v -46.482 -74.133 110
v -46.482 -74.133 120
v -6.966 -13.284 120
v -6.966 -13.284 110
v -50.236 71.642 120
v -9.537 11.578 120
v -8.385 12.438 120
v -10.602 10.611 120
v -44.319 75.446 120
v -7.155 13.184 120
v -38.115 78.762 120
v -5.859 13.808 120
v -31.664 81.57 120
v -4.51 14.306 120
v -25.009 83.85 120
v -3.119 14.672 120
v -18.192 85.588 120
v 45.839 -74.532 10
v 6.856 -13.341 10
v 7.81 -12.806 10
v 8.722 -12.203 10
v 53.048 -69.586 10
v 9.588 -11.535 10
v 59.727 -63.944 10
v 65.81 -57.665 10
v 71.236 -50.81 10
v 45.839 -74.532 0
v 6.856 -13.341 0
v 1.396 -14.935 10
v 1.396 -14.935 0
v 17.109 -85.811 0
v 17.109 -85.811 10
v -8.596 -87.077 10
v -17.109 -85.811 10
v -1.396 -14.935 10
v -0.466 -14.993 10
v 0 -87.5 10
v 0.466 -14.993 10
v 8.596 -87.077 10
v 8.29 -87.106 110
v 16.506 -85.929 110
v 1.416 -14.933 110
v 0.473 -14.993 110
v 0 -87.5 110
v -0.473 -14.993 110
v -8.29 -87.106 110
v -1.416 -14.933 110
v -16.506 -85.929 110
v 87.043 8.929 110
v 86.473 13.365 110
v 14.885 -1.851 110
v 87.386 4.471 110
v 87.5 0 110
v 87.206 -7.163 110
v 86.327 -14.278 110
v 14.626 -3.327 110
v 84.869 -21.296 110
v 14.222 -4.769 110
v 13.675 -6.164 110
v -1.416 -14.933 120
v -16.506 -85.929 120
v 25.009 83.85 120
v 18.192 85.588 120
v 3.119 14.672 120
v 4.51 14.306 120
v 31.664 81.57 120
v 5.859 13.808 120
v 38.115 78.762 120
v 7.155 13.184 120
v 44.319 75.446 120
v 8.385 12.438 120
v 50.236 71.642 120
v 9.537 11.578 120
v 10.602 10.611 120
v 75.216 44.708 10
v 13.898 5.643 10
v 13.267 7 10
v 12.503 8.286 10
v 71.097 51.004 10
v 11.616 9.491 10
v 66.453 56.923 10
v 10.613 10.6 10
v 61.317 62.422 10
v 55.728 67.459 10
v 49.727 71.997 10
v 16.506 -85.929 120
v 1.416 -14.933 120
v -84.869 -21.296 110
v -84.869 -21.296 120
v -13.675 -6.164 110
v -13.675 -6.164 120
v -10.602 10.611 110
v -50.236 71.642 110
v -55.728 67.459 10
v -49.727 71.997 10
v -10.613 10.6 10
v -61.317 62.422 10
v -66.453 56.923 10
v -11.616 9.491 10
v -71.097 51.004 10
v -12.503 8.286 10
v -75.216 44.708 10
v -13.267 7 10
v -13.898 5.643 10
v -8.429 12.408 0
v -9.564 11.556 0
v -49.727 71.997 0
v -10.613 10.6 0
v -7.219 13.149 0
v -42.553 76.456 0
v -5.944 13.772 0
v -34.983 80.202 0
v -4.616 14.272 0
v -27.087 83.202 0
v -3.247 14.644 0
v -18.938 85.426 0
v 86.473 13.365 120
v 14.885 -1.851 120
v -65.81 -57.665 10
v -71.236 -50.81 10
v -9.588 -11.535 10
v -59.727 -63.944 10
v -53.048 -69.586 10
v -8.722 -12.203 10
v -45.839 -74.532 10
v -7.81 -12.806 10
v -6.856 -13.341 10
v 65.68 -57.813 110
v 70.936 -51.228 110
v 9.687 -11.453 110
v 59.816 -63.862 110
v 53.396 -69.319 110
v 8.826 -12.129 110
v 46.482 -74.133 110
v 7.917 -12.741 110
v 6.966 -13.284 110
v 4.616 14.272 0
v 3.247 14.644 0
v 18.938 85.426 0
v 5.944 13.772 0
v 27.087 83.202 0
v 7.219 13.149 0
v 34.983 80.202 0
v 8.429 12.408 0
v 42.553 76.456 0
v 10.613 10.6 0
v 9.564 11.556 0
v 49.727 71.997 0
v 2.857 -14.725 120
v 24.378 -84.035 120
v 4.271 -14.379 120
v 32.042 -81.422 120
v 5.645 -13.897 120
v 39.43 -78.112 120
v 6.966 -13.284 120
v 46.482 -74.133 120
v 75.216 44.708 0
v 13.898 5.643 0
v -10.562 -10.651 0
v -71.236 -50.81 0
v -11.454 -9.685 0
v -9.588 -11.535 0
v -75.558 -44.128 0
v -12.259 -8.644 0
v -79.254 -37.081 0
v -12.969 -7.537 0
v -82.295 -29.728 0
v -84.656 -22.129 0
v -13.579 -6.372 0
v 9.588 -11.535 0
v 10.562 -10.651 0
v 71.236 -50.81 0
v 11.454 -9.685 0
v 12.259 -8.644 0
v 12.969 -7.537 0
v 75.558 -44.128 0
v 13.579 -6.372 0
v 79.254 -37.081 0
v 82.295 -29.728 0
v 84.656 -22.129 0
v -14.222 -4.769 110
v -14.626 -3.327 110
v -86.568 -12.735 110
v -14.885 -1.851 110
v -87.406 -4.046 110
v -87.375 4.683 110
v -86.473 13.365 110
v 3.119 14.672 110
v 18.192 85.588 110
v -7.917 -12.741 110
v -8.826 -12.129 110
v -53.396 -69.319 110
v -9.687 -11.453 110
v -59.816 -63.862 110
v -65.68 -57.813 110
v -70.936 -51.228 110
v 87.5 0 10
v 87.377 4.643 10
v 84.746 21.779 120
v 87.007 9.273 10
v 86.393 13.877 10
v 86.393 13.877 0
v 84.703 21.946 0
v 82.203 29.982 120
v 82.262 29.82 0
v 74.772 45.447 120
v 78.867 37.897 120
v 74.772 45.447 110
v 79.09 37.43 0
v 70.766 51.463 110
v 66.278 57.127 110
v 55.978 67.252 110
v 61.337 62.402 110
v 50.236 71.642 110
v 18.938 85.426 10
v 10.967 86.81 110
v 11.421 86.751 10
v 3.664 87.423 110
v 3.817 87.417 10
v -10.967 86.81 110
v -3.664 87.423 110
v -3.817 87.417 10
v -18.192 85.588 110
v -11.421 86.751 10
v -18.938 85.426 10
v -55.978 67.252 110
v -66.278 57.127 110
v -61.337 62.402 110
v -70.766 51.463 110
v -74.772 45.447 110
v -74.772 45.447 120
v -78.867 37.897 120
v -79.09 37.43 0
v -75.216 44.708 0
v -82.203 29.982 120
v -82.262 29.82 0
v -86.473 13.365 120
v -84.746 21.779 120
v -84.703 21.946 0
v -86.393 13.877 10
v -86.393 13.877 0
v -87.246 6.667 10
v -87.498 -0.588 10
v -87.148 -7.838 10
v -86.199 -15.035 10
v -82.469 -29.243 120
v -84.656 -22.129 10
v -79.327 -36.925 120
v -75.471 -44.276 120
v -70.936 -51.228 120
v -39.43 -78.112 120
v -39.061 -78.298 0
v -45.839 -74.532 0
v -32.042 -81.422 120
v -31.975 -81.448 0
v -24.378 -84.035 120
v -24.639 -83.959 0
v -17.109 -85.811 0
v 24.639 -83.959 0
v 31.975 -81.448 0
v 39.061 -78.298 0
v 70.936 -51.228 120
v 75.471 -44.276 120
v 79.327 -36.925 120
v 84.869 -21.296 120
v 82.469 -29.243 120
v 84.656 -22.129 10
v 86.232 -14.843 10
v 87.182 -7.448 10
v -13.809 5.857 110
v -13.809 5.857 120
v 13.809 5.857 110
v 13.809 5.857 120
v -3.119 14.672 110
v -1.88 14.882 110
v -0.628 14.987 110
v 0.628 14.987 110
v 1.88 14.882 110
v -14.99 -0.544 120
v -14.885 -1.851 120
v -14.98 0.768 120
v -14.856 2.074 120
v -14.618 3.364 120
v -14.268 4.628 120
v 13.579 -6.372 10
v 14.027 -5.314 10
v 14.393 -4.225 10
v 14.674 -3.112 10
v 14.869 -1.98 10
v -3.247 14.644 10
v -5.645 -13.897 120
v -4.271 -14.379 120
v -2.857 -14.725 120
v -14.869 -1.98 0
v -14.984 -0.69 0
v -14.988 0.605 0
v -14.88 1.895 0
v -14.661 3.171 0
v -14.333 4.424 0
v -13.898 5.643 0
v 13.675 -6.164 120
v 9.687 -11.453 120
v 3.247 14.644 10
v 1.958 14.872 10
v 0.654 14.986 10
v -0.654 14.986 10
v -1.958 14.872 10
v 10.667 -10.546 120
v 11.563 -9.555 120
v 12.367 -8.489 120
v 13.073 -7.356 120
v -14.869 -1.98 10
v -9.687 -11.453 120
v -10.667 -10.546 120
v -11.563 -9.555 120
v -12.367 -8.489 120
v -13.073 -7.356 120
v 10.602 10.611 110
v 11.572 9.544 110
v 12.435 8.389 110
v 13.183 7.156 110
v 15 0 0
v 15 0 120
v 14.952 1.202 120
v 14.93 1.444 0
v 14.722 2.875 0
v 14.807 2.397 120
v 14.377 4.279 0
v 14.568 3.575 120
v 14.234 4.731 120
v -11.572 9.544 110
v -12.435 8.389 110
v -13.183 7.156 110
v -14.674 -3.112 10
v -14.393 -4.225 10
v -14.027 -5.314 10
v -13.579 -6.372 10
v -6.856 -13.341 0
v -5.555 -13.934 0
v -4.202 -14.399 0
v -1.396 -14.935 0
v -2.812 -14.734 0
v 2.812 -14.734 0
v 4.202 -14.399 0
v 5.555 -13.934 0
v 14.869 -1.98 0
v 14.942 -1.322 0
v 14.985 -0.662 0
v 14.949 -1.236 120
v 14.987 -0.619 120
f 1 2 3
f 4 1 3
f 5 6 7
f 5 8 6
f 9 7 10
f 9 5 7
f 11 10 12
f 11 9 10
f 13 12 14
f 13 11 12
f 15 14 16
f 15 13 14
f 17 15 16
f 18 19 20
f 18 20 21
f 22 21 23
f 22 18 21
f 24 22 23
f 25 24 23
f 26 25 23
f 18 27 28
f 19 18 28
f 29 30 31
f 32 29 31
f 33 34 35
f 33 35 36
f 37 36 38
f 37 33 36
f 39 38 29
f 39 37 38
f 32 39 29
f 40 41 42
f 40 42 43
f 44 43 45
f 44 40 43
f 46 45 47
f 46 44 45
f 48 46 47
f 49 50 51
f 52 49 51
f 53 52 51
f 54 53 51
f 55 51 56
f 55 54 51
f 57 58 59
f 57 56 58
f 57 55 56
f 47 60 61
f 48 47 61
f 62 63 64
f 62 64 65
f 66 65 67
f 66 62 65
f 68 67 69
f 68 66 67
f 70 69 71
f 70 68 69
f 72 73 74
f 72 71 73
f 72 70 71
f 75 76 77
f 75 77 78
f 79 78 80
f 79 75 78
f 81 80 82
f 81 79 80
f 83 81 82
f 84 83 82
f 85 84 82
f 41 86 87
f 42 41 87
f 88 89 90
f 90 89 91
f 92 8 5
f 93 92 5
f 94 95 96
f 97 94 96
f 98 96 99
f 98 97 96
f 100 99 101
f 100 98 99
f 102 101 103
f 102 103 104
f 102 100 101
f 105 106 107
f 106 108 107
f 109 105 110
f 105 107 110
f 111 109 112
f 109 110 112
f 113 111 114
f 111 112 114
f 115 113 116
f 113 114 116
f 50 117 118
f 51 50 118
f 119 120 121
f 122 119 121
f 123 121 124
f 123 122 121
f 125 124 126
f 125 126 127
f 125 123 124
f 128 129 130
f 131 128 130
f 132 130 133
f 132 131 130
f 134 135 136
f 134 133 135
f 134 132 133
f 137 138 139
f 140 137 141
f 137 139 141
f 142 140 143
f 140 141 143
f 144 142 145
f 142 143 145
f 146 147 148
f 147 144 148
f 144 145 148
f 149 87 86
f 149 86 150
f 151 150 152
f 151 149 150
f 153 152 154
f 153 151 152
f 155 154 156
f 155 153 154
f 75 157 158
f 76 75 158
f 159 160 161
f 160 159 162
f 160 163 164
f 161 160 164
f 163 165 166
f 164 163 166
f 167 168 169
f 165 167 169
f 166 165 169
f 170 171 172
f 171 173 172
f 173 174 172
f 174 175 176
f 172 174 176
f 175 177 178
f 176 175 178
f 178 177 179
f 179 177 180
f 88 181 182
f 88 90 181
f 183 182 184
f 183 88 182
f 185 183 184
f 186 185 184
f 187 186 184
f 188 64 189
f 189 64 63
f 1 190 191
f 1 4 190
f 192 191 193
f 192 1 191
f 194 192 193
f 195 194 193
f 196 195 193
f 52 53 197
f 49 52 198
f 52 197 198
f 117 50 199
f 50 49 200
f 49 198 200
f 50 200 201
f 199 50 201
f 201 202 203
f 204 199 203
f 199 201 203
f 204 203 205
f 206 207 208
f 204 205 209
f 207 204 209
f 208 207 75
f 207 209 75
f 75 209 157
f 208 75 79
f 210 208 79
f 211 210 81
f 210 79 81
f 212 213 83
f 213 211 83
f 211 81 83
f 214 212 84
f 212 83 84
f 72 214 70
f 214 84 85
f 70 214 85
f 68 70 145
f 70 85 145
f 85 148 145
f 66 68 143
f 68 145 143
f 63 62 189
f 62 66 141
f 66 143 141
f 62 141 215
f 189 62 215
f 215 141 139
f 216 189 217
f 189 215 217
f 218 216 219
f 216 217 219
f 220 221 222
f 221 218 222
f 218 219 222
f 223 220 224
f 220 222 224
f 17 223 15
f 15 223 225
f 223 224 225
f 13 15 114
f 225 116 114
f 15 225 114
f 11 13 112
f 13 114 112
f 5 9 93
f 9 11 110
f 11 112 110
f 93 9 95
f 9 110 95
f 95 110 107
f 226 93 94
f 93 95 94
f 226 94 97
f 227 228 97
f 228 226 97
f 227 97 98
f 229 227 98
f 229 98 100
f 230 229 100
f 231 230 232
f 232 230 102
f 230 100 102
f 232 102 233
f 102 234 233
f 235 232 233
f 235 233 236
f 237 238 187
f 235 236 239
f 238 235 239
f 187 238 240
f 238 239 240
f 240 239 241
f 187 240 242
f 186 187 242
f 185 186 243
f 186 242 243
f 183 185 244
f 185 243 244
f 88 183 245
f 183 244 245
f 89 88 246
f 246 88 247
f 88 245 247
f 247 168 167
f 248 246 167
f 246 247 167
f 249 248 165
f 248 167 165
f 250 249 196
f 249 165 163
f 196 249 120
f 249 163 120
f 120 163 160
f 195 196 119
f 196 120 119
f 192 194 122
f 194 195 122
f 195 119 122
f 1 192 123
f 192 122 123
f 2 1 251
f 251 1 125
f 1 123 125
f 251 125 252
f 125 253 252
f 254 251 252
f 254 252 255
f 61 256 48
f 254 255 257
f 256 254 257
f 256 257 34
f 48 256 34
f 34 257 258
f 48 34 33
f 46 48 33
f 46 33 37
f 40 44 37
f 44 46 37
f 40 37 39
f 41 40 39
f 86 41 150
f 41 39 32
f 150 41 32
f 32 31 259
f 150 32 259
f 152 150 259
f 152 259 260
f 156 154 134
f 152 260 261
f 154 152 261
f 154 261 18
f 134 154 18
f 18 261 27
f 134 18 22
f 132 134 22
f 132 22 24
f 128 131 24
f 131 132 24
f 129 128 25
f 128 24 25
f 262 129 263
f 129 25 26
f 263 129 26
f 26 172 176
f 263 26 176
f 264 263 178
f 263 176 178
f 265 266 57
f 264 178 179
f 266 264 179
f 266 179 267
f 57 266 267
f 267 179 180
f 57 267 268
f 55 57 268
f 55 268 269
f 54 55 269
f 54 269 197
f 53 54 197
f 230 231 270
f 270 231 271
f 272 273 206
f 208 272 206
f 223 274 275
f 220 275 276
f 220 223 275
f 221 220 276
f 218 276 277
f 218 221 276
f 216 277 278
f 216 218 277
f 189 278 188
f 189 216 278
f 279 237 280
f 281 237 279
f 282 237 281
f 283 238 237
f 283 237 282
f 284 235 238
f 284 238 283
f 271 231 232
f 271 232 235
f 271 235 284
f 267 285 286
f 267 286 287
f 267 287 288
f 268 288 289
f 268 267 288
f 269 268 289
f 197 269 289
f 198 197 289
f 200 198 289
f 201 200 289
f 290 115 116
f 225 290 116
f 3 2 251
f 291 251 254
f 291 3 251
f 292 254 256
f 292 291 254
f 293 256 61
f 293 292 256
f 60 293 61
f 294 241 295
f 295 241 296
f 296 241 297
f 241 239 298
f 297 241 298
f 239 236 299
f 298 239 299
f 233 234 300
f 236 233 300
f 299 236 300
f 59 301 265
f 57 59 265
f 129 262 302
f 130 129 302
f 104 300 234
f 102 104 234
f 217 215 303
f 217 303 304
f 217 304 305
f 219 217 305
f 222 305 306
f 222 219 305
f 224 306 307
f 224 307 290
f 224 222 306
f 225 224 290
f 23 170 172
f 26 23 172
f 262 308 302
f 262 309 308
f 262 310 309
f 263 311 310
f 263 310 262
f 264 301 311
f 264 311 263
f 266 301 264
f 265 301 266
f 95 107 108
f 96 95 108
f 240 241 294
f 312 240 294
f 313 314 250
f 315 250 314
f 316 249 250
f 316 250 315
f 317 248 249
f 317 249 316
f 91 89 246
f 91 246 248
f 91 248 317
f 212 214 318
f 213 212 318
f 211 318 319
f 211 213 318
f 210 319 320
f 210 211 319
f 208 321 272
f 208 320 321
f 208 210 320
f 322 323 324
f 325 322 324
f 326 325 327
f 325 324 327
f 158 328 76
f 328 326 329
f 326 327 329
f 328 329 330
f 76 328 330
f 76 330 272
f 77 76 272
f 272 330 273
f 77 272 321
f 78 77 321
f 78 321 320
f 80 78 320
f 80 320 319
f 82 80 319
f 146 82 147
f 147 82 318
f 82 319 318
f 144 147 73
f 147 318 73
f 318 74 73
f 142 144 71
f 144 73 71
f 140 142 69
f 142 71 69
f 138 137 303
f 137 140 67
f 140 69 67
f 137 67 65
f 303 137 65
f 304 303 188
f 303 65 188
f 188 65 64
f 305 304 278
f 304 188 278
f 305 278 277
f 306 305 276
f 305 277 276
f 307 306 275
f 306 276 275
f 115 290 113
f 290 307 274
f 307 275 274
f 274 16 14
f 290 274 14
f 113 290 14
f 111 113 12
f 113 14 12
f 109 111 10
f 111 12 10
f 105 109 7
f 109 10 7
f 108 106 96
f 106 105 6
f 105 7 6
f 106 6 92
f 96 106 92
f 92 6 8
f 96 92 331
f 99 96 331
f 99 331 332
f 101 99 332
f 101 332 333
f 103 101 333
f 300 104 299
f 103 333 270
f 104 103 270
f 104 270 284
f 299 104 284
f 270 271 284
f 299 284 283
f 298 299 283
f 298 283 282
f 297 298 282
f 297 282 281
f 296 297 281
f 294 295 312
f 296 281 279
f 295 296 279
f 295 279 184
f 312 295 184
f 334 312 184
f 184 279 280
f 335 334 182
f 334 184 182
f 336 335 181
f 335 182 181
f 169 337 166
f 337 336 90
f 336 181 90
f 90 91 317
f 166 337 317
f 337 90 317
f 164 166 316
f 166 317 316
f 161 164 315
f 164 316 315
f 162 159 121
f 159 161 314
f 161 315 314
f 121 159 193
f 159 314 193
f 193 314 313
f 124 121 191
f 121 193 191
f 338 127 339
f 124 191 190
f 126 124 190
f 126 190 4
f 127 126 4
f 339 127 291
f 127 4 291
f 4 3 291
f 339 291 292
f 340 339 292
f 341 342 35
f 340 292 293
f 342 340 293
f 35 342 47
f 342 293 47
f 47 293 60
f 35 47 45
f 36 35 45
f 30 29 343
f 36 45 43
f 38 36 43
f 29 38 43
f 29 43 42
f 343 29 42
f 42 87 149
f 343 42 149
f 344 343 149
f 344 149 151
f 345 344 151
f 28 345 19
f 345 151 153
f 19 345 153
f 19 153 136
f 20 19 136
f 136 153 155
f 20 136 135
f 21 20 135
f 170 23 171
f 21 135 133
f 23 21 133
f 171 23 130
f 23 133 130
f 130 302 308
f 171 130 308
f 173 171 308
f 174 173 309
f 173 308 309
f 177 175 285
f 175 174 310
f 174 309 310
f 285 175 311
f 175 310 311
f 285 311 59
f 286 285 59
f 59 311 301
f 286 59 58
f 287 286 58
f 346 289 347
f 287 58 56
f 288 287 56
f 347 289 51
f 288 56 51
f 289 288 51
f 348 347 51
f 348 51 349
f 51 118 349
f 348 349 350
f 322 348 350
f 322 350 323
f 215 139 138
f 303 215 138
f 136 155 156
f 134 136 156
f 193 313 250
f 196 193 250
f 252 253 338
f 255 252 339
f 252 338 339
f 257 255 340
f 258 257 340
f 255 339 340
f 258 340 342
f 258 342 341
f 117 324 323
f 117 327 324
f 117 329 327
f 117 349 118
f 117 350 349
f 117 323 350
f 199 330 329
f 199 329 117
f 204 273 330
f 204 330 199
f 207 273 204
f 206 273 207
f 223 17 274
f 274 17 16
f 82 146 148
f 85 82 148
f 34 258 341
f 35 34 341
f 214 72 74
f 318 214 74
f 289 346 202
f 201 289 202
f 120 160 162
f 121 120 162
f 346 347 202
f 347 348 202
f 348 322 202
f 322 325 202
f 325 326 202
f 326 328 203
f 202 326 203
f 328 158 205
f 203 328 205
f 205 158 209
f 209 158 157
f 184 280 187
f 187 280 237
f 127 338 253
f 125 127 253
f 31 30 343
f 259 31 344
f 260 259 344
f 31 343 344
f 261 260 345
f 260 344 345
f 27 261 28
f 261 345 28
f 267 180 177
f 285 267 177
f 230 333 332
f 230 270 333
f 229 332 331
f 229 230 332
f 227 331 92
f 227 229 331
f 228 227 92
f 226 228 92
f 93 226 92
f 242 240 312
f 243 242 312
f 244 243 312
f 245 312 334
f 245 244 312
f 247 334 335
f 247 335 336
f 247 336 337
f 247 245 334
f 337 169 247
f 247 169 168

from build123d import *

# Parameters (mm, degrees)
SKETCH1_R           = 87.5
BOSS_EXTRUDE1_DEPTH = 120
CUT_EXTRUDE1_DEPTH  = 10
CIRPATTERN1_COUNT   = 8
CUT_EXTRUDE2_DEPTH  = 10
CIRPATTERN2_COUNT   = 8
SKETCH5_R           = 15
CUT_EXTRUDE3_DEPTH  = 121


with BuildPart() as part:
    # Sketch1 → Boss-Extrude1 (new body)
    with BuildSketch(Plane.XY):
        Circle(SKETCH1_R)
    extrude(amount=BOSS_EXTRUDE1_DEPTH)

    # Sketch2 → Cut-Extrude1 (cut)
    with BuildSketch(Plane.XY.offset(120)):
        Polygon((-104.60287609, 492.11784039), (-18.192272947, 85.587915064), (0, 0), (18.192272947, 85.587915064), (104.60287609, 492.11784039), (104.60287609, 1323.341931767), (-104.60287609, 1323.341931767), align=None)
    cut_extrude1 = extrude(amount=-CUT_EXTRUDE1_DEPTH, mode=Mode.SUBTRACT)

    # CirPattern1: Cut-Extrude1 ×8 about axis
    cirpattern1_axis = Axis((0, -4.136271665, 0), (0, 0, 1))
    for i in range(1, CIRPATTERN1_COUNT):
        add(cut_extrude1.rotate(cirpattern1_axis, i * 360 / CIRPATTERN1_COUNT), mode=Mode.SUBTRACT)

    # Sketch4 → Cut-Extrude2 (cut)
    with BuildSketch(Plane(origin=(0, 0, 0), x_dir=(-1, 0, 0), z_dir=(0, 0, -1))):
        Polygon((-109.002412997, 491.678111226), (-18.93846622, 85.425900623), (0, 0), (18.93846622, 85.425900623), (109.002412997, 491.678111226), (109.002412997, 1323.909745158), (-109.002412997, 1323.909745158), align=None)
    cut_extrude2 = extrude(amount=-CUT_EXTRUDE2_DEPTH, mode=Mode.SUBTRACT)

    # CirPattern2: Cut-Extrude2 ×8 about axis
    cirpattern2_axis = Axis((0, -4.318782825, 0), (0, 0, 1))
    for i in range(1, CIRPATTERN2_COUNT):
        add(cut_extrude2.rotate(cirpattern2_axis, i * 360 / CIRPATTERN2_COUNT), mode=Mode.SUBTRACT)

    # Sketch5 → Cut-Extrude3 (cut, through all)
    with BuildSketch(Plane.XY.offset(120)):
        Circle(SKETCH5_R)
    extrude(amount=-CUT_EXTRUDE3_DEPTH, mode=Mode.SUBTRACT)


solid = part.part
